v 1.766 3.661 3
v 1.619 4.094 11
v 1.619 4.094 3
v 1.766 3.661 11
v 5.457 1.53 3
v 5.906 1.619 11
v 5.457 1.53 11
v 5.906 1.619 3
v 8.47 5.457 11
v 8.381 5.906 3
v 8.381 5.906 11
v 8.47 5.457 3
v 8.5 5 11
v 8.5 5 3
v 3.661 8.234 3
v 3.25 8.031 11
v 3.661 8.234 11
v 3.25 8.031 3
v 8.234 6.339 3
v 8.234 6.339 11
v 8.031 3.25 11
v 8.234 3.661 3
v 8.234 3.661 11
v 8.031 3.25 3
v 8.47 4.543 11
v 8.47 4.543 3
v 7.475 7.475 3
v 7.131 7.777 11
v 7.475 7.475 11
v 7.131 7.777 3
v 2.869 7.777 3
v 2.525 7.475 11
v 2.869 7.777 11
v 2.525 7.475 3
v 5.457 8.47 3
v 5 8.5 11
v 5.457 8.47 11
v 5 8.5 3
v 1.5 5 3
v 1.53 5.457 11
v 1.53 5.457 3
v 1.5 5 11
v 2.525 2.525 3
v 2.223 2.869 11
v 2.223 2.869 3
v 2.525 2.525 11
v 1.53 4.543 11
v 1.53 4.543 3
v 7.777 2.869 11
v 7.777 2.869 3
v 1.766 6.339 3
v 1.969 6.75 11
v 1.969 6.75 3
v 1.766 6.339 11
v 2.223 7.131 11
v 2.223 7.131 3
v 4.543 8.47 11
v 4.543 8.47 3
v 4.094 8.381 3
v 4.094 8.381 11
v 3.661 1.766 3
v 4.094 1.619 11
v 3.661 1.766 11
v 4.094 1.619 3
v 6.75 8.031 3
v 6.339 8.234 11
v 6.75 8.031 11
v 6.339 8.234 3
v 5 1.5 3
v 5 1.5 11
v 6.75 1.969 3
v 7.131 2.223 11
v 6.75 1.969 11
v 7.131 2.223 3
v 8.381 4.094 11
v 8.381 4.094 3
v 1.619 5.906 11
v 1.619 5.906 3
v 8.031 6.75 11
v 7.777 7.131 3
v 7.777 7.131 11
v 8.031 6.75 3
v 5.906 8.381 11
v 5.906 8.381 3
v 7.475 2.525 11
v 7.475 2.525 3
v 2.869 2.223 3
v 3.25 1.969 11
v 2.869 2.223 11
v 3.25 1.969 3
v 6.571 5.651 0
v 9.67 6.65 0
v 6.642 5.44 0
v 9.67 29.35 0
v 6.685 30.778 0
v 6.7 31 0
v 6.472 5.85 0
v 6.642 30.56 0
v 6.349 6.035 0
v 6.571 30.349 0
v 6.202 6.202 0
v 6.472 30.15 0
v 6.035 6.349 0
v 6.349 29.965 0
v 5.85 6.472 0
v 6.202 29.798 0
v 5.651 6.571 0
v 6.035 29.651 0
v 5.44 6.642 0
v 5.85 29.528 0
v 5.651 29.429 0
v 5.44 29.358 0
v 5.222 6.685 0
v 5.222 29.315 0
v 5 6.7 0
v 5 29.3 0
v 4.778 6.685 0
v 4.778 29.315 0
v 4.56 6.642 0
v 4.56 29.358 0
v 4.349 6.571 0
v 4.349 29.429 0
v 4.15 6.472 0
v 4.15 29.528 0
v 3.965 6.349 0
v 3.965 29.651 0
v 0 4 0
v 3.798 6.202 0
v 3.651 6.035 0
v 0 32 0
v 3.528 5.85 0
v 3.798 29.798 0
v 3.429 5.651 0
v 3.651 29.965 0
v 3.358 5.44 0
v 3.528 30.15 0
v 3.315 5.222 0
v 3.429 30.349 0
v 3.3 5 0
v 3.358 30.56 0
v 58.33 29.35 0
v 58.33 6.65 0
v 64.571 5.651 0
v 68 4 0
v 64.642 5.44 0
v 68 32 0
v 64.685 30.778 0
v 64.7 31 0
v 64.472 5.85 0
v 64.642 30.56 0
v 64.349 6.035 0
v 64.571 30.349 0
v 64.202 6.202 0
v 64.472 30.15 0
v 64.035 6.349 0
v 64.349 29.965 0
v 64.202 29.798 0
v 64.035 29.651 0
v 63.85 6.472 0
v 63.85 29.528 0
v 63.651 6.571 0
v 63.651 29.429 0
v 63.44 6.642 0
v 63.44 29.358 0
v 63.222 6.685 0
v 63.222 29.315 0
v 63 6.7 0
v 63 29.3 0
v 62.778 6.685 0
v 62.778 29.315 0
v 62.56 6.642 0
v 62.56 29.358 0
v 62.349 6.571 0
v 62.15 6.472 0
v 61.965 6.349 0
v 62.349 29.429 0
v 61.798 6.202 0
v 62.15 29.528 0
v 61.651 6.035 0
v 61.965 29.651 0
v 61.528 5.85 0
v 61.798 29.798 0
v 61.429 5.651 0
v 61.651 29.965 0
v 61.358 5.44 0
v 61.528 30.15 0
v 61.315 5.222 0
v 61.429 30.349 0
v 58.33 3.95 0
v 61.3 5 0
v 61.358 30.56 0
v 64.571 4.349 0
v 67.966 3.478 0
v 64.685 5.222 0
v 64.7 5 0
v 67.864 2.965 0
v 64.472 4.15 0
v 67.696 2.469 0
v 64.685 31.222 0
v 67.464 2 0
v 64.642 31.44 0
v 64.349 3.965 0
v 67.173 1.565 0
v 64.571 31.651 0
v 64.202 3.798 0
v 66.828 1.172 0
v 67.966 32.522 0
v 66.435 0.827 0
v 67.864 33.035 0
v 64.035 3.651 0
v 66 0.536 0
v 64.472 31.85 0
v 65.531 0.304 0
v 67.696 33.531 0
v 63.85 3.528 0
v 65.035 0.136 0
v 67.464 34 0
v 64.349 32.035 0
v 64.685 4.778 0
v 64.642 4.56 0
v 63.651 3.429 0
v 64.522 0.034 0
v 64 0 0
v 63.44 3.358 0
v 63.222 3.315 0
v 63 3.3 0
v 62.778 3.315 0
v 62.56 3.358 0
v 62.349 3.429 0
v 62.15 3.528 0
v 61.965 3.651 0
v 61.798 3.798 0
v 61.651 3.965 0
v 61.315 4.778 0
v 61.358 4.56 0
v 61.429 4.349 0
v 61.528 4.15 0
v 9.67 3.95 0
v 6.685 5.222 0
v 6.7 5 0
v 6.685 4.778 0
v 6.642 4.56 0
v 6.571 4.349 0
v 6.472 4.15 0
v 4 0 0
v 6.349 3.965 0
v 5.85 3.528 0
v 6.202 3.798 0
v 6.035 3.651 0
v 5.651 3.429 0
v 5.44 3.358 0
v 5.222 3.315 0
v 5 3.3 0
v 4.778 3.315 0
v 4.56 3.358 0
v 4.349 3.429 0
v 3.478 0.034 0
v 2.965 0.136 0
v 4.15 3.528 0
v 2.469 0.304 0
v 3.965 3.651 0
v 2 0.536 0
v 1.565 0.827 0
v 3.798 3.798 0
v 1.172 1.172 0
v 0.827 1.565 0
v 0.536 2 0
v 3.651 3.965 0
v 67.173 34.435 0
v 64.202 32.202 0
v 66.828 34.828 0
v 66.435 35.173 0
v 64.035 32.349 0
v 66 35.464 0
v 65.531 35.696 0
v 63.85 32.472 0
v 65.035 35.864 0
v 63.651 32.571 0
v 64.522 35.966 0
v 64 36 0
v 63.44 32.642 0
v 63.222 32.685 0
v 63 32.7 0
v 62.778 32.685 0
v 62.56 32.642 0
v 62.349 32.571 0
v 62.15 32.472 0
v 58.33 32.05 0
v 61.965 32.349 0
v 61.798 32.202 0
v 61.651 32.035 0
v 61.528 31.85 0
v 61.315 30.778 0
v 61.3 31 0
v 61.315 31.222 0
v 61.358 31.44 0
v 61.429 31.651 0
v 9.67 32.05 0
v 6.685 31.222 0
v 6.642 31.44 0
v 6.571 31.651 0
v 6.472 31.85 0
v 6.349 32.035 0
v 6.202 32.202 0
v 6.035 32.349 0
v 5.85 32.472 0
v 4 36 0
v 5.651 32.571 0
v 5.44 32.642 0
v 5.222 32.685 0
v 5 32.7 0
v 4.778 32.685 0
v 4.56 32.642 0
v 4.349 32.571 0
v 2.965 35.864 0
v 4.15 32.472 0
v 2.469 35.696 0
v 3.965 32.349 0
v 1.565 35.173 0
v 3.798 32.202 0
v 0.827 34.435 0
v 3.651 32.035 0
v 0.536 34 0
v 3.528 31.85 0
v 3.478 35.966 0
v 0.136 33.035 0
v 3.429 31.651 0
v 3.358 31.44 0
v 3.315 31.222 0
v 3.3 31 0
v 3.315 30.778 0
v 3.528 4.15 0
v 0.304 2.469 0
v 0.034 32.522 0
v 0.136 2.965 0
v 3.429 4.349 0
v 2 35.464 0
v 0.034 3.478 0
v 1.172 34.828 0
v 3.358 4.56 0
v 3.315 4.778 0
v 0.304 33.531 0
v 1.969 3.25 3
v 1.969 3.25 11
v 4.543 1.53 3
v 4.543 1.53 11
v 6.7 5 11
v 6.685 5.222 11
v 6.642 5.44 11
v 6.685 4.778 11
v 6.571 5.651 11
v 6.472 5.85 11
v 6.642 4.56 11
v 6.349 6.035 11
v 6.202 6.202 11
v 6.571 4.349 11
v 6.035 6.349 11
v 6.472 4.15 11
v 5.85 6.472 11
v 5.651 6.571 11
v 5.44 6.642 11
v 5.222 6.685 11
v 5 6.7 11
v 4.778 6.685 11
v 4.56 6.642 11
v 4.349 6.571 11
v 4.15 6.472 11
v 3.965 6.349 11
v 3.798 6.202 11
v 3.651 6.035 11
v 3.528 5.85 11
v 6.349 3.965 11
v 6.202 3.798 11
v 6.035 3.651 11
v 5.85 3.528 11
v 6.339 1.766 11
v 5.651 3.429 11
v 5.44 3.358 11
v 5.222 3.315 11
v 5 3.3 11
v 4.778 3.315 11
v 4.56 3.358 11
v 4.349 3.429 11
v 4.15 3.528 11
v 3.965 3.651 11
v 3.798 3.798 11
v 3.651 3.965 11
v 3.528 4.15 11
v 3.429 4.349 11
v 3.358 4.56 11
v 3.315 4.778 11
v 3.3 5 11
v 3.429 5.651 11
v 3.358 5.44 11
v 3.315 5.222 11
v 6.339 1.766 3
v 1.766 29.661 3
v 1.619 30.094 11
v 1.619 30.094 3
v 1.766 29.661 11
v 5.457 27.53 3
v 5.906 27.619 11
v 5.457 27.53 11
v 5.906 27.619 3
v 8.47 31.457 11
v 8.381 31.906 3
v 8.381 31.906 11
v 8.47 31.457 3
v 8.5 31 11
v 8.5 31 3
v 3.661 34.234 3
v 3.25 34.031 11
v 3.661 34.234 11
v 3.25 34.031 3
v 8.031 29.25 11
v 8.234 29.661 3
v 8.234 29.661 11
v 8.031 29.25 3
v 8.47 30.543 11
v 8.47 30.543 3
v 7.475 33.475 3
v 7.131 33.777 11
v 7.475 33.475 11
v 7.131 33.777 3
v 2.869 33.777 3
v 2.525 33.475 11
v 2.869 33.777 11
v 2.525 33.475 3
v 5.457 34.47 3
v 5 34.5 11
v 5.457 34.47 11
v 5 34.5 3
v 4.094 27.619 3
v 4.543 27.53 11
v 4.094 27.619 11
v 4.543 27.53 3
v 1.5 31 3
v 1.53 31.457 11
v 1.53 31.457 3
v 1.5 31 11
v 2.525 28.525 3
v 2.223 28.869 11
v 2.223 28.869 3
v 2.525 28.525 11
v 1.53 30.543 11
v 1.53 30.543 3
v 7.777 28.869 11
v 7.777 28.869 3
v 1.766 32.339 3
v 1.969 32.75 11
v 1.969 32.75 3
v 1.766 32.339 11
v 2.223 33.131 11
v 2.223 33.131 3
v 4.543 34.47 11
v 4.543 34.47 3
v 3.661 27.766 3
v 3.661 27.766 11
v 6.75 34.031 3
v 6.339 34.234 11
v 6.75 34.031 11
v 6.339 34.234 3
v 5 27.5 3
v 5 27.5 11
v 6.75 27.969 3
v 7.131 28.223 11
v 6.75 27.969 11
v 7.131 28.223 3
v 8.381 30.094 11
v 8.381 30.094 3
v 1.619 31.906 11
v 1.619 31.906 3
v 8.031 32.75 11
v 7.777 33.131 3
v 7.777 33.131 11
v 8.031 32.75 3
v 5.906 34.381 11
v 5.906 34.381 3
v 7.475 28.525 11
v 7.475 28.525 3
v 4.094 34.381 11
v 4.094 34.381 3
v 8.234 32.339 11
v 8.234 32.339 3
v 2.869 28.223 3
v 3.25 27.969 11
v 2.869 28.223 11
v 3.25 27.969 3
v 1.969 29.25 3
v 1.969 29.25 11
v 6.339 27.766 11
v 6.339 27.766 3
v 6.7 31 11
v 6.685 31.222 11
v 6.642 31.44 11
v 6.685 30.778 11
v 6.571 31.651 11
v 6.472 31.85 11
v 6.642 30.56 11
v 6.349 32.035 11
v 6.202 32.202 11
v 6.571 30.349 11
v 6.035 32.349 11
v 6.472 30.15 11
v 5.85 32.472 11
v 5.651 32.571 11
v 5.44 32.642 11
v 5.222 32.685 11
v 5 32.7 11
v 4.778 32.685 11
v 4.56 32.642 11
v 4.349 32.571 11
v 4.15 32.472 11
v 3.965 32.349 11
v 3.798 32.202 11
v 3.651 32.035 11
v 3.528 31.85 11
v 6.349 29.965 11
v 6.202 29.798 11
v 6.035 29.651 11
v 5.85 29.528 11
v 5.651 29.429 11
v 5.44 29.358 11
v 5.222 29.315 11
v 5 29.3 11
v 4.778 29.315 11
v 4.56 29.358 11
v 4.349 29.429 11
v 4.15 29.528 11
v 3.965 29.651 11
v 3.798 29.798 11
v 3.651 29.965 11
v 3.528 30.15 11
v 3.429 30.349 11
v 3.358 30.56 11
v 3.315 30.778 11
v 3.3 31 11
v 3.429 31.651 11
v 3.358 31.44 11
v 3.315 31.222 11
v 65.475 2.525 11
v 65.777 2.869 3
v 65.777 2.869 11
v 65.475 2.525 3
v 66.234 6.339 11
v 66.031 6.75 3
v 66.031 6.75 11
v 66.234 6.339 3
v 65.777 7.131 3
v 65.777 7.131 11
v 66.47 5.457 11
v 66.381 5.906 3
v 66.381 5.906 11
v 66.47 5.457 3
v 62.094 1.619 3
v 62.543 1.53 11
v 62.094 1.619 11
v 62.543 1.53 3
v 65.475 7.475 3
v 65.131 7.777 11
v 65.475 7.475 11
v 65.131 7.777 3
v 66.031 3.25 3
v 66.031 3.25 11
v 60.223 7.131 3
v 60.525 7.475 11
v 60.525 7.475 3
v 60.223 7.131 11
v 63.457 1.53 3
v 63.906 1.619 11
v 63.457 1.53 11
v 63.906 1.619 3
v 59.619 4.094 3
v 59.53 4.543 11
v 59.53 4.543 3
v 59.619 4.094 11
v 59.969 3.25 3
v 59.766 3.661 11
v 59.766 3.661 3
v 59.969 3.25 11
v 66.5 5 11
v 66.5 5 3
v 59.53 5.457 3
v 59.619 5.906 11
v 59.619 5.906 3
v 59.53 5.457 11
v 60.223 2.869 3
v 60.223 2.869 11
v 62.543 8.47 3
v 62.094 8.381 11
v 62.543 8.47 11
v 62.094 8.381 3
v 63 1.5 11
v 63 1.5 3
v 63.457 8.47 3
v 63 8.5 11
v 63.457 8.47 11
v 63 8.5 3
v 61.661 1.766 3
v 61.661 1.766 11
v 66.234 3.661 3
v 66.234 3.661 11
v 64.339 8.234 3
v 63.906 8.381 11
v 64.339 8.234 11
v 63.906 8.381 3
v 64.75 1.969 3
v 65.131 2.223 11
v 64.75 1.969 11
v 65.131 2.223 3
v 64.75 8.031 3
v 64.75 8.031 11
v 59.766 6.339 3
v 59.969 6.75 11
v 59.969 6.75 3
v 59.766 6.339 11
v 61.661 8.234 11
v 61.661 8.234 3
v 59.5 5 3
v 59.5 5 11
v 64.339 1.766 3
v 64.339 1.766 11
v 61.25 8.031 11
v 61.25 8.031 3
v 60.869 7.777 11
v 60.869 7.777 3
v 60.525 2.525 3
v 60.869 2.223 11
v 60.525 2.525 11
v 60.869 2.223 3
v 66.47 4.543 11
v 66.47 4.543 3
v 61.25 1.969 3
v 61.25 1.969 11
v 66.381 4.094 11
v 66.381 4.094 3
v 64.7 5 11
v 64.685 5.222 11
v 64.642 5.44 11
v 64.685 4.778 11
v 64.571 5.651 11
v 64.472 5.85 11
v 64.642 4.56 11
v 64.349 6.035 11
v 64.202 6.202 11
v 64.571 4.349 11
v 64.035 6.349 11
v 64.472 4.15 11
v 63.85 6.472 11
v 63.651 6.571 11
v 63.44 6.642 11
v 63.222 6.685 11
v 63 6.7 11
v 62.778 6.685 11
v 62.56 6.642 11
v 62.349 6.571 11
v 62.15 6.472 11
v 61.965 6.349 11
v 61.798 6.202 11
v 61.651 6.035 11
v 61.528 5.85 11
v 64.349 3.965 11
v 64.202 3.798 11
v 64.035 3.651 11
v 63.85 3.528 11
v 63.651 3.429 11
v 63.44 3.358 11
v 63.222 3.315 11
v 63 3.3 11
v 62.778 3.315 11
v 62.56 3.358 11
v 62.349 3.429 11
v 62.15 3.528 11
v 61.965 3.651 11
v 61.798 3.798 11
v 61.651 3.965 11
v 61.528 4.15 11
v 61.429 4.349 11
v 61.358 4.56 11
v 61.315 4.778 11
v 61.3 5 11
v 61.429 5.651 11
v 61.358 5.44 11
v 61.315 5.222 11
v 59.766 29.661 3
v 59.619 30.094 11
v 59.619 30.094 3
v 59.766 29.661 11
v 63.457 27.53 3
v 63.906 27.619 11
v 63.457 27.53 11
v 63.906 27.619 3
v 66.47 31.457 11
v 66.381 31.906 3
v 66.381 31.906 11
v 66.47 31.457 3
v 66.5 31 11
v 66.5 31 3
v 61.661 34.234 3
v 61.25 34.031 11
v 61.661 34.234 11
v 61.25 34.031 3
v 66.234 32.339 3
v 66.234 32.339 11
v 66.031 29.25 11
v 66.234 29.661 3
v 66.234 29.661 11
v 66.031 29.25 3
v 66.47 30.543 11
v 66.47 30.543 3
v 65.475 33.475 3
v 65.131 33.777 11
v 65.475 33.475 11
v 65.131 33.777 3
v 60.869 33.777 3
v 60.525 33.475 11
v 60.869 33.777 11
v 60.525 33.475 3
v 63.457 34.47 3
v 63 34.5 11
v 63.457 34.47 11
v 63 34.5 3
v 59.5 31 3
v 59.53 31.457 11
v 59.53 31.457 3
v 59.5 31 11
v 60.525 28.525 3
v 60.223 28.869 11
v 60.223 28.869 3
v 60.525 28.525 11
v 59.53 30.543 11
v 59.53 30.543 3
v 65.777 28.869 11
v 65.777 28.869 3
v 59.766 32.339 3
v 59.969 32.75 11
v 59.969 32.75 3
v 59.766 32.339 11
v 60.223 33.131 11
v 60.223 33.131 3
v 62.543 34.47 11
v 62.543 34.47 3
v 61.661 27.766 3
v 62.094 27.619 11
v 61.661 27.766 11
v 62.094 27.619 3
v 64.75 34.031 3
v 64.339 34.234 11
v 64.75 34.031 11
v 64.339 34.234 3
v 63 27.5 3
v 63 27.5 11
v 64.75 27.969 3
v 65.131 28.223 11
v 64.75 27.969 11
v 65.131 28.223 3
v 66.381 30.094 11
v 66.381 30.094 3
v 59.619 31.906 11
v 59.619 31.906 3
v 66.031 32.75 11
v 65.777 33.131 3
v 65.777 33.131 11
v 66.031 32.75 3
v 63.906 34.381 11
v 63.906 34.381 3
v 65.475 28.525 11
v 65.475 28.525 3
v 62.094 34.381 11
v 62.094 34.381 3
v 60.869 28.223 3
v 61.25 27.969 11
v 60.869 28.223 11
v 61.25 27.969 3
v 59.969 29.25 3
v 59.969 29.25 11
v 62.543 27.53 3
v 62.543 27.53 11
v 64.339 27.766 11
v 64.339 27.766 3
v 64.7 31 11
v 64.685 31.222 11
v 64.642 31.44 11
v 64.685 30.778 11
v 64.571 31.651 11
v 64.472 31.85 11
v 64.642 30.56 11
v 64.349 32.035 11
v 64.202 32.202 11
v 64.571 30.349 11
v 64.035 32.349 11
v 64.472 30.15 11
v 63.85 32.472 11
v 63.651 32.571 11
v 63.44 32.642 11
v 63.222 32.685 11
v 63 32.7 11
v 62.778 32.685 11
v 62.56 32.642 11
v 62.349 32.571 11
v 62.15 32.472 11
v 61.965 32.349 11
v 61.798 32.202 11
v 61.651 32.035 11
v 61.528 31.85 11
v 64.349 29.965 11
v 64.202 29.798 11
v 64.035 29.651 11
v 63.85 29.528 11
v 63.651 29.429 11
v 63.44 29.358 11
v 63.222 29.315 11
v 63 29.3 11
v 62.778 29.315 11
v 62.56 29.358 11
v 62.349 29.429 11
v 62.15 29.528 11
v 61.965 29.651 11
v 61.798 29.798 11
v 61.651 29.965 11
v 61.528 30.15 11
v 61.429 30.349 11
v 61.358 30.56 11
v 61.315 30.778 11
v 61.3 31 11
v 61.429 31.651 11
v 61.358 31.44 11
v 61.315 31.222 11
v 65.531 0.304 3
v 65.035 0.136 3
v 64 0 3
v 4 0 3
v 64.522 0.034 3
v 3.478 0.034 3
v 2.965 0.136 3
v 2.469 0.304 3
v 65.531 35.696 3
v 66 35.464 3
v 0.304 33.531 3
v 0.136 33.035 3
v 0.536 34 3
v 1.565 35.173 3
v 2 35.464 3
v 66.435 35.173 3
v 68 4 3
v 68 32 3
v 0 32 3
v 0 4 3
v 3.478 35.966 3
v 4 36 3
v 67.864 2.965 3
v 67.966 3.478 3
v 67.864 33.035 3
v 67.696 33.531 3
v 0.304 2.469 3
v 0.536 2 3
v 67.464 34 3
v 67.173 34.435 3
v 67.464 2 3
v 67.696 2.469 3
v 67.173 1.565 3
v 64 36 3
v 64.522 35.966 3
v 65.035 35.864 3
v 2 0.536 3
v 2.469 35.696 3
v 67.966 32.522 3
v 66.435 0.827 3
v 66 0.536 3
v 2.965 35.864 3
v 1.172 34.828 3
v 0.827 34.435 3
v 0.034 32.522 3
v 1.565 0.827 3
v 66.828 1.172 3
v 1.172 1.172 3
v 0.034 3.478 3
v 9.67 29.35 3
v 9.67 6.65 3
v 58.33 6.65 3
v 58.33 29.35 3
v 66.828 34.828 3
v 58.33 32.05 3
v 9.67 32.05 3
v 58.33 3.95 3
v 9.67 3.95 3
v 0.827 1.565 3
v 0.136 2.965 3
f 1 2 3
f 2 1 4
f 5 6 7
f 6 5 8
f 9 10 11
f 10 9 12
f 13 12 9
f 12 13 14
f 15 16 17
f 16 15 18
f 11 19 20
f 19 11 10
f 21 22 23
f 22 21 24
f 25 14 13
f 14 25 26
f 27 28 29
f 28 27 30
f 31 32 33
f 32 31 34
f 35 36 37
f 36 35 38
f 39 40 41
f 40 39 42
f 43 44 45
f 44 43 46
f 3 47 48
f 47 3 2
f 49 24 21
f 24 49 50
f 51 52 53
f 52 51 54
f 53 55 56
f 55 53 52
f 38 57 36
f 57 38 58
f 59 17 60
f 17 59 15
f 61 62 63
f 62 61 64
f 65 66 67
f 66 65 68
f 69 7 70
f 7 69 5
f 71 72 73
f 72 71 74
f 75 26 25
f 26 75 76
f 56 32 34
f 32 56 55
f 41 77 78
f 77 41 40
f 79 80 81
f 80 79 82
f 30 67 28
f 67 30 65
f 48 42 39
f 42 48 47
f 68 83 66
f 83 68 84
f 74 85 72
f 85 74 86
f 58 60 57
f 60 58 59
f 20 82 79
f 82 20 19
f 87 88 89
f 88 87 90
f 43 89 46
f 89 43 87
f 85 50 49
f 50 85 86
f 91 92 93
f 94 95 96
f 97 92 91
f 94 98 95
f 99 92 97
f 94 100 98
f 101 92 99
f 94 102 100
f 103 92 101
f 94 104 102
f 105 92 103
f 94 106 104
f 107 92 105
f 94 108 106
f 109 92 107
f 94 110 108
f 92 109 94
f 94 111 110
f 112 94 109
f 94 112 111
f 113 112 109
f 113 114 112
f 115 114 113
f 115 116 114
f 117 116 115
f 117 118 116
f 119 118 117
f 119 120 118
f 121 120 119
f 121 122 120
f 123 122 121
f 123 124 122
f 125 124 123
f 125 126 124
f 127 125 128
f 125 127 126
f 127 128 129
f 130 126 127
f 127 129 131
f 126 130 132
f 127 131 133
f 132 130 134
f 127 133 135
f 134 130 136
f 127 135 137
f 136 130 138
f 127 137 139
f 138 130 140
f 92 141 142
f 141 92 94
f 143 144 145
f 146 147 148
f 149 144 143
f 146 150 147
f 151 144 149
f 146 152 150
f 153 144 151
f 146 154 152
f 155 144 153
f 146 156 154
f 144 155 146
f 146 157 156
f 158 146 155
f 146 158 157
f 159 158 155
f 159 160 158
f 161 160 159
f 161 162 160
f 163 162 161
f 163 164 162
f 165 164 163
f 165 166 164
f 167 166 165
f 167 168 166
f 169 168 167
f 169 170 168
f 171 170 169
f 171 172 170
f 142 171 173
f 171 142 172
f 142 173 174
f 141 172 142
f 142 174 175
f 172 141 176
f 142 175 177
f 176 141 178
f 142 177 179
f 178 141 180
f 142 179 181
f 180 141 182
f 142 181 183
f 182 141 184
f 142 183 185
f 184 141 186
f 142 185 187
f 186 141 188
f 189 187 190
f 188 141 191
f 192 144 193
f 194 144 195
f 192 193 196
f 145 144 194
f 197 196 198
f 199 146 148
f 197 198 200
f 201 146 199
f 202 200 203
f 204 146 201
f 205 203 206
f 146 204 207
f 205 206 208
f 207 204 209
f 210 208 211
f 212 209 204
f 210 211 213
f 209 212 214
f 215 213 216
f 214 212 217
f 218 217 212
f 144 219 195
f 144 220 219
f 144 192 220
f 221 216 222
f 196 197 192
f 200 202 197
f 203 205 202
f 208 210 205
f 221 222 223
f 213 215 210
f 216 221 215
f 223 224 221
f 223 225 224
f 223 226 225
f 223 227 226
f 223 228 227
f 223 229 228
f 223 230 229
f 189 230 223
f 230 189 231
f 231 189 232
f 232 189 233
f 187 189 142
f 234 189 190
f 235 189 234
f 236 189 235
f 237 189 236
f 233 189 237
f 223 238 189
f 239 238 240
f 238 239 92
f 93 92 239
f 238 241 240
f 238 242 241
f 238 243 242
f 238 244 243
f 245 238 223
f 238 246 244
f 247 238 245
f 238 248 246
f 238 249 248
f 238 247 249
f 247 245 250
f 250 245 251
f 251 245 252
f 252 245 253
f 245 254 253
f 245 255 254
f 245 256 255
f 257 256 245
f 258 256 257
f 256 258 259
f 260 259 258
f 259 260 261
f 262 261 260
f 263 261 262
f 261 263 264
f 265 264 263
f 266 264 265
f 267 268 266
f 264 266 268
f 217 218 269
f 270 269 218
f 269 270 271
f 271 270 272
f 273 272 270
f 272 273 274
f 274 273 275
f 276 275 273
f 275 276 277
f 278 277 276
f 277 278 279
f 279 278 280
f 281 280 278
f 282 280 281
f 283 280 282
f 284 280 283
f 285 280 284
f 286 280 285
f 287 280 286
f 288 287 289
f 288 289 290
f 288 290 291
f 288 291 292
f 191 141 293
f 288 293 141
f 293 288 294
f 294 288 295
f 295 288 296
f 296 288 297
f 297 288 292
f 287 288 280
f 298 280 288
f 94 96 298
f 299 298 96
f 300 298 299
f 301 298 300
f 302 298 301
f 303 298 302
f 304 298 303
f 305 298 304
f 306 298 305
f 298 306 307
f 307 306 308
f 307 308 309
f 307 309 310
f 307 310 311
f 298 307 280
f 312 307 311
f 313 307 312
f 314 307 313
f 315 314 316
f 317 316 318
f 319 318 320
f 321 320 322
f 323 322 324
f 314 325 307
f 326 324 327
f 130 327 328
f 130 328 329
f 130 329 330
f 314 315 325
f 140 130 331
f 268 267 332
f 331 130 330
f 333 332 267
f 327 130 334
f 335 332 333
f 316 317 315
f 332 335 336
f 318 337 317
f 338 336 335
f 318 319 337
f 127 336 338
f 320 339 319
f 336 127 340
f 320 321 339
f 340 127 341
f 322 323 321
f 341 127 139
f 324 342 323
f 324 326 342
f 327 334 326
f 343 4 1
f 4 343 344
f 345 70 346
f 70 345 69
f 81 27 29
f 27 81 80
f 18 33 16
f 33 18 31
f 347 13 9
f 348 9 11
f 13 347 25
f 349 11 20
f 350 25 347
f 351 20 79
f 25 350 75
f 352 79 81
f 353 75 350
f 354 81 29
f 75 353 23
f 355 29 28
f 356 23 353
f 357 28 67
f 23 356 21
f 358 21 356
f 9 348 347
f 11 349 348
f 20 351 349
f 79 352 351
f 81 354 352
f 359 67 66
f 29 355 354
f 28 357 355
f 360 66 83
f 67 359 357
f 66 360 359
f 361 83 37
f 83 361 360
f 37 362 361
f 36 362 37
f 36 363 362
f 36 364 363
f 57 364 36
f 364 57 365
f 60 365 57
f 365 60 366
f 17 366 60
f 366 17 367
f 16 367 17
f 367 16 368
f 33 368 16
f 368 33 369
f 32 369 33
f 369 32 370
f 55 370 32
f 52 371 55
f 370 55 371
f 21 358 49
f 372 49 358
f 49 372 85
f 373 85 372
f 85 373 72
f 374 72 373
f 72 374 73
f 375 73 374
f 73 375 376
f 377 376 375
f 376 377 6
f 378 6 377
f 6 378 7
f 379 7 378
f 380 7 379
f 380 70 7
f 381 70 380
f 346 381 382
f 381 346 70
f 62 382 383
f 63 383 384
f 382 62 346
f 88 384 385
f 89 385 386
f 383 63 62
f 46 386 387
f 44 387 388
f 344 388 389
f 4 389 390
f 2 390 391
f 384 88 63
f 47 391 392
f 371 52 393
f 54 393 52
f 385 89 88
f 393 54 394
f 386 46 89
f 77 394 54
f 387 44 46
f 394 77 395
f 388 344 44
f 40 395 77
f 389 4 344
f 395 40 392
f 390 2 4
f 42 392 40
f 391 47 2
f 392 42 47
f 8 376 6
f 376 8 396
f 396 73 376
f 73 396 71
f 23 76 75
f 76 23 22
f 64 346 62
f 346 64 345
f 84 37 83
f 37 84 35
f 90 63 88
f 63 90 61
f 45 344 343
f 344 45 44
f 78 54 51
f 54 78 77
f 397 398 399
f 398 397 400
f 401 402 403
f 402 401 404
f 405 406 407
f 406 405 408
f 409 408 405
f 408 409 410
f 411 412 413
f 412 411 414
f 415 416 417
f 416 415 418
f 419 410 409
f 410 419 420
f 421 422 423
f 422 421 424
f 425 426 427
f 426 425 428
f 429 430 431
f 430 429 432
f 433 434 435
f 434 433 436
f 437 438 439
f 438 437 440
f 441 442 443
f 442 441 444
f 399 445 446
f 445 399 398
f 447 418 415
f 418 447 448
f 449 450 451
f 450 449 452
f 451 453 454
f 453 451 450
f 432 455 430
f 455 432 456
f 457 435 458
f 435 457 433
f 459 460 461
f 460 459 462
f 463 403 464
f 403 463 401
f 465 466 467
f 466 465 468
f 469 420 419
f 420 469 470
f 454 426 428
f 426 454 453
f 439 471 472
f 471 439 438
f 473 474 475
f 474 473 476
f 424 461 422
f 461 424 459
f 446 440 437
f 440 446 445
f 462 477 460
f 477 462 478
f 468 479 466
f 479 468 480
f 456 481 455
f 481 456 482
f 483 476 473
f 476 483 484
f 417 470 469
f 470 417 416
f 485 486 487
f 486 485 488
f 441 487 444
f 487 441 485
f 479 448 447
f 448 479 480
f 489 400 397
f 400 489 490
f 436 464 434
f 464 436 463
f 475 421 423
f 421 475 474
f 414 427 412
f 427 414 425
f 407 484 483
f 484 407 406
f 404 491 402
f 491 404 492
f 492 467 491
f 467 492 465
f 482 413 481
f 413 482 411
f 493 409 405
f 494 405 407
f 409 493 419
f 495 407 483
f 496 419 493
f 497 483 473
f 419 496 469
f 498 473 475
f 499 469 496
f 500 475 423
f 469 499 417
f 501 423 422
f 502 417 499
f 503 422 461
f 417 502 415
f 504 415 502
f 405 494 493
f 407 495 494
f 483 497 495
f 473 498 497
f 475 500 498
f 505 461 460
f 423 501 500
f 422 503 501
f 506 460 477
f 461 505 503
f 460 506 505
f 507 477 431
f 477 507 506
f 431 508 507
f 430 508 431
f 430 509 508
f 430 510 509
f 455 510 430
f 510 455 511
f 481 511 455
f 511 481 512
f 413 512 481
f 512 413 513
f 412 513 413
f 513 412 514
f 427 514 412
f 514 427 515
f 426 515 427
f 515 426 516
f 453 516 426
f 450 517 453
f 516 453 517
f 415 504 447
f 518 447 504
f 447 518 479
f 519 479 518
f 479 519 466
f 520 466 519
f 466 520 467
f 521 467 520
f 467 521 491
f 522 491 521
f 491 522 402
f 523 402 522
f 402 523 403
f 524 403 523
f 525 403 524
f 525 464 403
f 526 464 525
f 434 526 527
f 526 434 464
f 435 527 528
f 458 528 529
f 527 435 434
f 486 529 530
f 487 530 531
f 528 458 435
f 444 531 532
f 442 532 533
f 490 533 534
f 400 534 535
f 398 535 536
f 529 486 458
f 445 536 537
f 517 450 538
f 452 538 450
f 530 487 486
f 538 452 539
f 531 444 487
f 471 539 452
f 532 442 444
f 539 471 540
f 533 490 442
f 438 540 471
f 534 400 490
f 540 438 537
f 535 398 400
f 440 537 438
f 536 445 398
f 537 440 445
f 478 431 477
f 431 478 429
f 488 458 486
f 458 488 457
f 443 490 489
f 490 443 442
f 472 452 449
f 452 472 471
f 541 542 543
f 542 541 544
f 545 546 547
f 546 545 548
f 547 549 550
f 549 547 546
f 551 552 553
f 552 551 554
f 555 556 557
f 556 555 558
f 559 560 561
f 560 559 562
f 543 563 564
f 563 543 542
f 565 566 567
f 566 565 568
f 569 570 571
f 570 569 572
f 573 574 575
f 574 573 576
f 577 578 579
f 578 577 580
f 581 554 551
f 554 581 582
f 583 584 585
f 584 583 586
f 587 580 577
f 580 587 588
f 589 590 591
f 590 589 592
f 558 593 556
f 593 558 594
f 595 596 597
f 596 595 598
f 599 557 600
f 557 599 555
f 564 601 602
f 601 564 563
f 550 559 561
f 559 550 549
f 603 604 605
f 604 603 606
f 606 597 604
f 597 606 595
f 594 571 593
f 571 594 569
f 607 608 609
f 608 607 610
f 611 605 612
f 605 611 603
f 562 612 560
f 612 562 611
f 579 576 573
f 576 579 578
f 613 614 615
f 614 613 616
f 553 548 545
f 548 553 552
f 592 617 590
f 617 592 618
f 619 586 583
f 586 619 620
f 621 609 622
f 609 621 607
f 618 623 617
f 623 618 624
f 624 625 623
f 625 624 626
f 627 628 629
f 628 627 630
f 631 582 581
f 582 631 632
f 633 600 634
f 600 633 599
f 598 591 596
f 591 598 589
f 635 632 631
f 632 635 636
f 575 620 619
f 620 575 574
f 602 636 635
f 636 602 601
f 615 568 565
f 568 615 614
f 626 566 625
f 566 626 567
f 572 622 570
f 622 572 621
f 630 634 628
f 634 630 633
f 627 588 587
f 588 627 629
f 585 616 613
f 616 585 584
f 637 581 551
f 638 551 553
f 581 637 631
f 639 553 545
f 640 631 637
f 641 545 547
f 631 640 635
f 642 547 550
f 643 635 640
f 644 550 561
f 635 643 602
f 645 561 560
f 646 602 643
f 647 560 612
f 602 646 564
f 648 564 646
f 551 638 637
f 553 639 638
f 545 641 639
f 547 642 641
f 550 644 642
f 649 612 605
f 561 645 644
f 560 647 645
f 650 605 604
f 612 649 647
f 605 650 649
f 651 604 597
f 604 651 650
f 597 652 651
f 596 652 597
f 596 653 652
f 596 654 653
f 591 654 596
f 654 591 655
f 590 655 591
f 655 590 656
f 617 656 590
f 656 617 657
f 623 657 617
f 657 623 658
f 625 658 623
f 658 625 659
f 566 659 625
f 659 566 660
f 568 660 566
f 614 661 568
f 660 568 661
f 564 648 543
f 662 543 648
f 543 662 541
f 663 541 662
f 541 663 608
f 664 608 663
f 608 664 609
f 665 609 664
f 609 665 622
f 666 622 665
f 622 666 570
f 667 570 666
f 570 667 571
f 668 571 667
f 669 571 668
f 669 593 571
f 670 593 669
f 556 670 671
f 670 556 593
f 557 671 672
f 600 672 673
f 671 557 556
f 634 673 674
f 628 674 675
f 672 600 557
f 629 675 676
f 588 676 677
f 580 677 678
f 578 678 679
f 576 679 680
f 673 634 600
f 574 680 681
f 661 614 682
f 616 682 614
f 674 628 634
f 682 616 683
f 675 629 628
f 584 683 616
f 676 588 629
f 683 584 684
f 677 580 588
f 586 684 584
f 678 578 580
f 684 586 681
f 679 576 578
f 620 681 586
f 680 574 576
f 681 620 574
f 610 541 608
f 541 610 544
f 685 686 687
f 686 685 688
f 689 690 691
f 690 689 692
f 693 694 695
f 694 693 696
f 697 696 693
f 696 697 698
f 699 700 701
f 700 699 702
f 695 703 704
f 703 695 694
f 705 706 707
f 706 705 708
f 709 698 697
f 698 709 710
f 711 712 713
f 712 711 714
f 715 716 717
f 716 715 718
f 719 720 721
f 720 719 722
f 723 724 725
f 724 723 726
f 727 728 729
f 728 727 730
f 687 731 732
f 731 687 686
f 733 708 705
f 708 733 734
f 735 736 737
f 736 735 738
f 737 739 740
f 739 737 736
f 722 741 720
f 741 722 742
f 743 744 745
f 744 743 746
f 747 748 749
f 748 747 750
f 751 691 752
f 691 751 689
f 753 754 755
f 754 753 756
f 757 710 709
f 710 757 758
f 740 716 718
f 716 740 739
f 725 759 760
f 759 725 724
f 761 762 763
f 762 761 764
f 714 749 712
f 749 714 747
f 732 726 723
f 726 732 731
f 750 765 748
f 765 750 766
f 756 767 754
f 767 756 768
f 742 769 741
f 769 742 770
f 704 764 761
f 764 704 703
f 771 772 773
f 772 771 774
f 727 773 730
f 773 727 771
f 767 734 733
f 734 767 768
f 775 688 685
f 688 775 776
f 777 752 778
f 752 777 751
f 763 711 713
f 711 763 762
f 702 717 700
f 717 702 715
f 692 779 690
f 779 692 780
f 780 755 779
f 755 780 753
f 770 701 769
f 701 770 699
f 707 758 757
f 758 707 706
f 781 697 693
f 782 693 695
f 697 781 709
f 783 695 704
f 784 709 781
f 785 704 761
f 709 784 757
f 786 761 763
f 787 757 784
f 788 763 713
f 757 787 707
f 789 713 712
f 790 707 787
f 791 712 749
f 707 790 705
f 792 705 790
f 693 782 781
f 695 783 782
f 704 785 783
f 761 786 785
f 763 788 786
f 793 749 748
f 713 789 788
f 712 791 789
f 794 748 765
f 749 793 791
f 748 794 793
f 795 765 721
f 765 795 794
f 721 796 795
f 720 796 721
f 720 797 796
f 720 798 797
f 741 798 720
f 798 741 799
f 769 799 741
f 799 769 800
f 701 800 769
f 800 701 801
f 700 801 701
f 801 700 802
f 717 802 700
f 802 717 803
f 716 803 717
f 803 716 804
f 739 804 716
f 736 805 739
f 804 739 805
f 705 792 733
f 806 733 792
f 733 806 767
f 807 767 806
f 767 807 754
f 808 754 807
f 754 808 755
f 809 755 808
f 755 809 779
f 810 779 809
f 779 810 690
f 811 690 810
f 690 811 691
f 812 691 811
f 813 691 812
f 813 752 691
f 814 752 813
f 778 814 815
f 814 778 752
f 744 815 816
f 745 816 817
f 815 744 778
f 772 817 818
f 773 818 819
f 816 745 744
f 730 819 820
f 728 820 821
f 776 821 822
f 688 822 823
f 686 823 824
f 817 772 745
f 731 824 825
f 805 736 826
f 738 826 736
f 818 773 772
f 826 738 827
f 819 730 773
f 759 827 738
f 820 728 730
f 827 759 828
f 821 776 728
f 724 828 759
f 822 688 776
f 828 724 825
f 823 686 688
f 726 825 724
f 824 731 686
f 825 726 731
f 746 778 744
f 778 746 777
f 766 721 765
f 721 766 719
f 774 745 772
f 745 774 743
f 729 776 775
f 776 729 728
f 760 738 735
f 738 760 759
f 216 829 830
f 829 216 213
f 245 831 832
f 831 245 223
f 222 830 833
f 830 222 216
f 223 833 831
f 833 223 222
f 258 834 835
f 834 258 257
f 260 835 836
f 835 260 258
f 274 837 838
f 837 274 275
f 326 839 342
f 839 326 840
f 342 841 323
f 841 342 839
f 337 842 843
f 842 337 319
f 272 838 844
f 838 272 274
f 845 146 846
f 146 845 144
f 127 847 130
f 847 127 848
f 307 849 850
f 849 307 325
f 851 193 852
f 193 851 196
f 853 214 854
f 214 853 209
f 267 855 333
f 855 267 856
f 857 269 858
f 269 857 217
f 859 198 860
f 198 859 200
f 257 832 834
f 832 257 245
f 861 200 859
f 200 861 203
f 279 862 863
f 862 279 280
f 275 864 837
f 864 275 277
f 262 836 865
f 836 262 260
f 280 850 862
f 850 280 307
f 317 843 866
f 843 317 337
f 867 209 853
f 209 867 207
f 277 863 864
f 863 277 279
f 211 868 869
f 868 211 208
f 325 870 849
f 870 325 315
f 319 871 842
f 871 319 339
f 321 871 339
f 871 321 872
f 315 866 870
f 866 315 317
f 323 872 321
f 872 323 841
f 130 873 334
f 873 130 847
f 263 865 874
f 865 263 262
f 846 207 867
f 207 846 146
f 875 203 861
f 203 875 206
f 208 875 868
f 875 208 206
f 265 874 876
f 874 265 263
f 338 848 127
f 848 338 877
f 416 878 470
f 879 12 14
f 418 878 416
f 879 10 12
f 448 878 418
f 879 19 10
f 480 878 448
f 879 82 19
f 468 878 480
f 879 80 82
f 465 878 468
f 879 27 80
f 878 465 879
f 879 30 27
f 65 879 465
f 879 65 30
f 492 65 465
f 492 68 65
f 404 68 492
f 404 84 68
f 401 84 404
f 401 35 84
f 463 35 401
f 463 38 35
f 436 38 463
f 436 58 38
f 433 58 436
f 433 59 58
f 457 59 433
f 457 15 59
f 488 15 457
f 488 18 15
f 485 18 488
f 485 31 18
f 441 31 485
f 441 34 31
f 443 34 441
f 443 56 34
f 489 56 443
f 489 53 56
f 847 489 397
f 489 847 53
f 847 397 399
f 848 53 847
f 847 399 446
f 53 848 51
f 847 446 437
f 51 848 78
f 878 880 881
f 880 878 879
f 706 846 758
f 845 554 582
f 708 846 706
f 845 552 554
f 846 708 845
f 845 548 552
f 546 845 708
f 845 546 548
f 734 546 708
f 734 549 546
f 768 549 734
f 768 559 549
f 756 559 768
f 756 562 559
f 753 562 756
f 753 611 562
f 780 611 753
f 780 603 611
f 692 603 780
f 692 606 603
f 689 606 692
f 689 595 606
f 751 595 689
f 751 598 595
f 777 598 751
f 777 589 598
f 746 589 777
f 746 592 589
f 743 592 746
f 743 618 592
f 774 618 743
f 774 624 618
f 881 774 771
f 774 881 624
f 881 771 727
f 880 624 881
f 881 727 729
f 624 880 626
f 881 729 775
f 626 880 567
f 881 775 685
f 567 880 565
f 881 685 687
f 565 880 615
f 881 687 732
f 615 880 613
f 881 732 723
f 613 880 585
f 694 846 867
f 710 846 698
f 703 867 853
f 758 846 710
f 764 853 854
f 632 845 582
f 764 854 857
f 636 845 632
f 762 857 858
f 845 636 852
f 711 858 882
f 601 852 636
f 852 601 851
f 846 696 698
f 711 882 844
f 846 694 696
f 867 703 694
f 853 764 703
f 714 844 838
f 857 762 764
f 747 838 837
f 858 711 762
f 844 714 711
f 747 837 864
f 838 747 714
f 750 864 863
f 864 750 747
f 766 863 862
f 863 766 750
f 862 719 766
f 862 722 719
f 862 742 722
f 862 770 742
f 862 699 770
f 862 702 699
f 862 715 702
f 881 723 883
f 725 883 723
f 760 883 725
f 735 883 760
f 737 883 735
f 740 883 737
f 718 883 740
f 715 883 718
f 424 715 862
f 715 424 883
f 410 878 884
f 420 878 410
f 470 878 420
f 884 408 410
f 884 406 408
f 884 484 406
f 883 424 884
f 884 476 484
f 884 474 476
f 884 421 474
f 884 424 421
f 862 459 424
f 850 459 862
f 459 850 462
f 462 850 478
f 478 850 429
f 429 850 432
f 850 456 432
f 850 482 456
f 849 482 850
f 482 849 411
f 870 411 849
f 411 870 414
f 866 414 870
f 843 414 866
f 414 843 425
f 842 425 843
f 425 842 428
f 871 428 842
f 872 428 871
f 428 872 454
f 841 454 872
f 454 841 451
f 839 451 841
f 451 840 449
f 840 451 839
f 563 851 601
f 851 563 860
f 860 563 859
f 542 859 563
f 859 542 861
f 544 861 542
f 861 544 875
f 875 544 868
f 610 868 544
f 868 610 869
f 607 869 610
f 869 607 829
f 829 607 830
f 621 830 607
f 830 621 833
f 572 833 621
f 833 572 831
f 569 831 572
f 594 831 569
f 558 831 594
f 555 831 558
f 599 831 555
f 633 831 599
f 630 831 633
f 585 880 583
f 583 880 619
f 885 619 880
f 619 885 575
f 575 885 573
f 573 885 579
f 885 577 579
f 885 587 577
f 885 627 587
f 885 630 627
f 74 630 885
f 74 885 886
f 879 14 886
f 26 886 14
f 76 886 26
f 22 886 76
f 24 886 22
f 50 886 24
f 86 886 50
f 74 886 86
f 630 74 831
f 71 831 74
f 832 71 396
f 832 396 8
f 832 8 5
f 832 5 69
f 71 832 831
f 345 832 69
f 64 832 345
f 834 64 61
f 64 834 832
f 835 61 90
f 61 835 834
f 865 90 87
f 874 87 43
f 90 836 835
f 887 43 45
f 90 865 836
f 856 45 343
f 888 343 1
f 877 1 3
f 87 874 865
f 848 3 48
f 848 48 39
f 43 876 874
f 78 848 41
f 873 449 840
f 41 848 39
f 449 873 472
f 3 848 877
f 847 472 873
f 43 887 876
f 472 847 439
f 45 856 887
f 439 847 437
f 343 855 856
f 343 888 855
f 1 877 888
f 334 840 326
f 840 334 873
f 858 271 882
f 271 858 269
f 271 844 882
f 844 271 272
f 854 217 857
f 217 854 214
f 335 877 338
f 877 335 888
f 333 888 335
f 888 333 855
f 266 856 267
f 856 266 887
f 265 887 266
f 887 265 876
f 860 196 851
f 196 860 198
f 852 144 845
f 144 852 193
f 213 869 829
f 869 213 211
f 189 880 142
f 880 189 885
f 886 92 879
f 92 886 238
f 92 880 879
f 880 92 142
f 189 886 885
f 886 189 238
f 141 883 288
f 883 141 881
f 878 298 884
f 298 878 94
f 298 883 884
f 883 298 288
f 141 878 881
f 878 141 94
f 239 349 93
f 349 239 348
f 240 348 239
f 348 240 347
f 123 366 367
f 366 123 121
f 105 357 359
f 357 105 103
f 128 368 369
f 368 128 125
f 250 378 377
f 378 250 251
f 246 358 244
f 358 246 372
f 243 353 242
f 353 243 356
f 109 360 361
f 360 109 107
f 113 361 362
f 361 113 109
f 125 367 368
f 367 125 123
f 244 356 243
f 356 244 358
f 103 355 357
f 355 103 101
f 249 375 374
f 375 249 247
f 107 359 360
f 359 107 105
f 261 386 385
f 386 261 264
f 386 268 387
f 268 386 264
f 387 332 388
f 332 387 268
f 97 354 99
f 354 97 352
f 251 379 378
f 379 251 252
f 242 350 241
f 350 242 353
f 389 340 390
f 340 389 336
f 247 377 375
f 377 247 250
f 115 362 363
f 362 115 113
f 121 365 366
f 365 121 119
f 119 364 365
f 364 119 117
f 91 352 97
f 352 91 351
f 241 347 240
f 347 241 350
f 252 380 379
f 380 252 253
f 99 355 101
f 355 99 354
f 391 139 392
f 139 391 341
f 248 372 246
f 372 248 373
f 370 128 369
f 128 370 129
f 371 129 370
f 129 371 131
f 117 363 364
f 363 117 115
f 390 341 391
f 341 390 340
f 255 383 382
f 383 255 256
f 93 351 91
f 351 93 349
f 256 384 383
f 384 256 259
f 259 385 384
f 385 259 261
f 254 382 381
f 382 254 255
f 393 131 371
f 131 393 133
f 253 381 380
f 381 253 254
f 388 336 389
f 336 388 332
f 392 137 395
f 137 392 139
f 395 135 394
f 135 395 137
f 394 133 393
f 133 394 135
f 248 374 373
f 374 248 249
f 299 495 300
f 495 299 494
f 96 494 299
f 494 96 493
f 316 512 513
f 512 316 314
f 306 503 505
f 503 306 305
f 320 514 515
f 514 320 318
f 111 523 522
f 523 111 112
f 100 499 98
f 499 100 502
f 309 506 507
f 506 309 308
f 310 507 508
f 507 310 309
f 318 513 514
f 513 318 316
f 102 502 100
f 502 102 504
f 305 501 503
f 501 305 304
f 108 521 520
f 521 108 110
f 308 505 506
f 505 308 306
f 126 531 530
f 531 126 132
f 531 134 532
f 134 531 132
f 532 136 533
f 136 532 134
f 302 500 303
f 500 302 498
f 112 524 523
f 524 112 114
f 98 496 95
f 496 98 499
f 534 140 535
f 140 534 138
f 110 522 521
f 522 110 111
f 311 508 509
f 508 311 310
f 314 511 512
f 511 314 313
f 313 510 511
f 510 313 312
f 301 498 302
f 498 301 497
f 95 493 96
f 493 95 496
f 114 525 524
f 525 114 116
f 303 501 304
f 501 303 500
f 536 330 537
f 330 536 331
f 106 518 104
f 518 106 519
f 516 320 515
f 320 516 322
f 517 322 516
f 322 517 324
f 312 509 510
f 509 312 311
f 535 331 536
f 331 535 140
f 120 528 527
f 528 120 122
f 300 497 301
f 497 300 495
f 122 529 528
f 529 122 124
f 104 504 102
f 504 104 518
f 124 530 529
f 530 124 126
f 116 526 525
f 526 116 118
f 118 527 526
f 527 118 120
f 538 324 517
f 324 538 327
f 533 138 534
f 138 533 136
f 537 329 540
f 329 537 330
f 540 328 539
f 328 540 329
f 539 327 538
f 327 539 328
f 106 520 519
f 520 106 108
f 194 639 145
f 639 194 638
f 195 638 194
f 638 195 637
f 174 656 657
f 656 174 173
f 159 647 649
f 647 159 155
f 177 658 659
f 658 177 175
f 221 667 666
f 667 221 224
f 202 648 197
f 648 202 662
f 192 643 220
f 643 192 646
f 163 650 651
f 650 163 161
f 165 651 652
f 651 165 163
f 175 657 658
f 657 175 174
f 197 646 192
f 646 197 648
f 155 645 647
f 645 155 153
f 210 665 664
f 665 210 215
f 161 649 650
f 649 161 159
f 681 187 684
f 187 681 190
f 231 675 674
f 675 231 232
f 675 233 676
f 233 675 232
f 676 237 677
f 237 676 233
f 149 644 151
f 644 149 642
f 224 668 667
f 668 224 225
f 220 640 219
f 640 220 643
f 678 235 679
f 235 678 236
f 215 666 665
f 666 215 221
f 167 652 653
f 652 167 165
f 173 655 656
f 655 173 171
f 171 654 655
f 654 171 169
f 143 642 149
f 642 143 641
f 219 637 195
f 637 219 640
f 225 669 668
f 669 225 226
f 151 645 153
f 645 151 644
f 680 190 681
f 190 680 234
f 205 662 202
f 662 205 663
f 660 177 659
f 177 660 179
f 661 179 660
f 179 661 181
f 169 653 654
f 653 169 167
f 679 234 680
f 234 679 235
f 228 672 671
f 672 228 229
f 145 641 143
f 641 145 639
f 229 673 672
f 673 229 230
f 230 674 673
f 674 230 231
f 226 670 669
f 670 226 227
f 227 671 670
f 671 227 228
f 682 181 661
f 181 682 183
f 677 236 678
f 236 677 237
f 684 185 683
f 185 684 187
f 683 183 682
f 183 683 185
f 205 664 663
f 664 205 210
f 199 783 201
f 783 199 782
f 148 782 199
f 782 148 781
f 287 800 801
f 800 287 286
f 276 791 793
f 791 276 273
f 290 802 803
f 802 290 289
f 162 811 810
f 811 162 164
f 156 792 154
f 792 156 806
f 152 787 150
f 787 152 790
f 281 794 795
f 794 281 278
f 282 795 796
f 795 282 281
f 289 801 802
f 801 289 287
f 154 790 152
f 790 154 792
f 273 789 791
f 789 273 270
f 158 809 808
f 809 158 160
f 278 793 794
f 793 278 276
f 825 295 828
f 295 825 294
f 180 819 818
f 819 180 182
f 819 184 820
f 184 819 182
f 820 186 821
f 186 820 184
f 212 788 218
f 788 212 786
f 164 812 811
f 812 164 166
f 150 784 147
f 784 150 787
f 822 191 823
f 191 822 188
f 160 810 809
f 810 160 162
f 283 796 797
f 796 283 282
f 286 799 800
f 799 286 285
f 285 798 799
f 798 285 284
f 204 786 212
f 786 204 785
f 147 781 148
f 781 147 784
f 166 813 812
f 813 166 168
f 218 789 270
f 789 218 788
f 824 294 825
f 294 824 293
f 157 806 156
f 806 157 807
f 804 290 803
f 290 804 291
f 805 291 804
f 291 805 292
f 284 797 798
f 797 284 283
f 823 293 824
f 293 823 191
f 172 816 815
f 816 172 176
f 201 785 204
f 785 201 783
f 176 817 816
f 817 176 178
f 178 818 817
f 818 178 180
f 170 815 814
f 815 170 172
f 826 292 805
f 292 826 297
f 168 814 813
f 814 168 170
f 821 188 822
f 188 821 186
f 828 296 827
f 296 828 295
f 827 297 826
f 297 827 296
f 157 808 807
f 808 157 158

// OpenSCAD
// ESP32 DevKit header carrier - The Build Book
// https://tobno683.github.io/arduino-build-book/basics/printing.html#prints
//
// Printed plate-down. Turned over, the corner posts are its feet.
// Press a female header strip into each slot, flush with the underside.
//
// Millimetres. Change the numbers at the top and render (F6); everything
// below follows from them. Written by tools/make-prints.js from the same
// numbers as the STL next to it.

/* [Board] */
pins = 19;        // per row
pitch = 2.54;
rows = 25.4;     // centre to centre across the two pin rows - MEASURE YOURS

/* [Carrier] */
slot_w = 2.7;      // a female header is about 2.5 mm wide, and printed slots come out narrow
slot_extra = 0.4;  // added to the slot length
plate = [68, 36];
plate_t = 3;
corner_r = 4;
foot_d = 7;
foot_h = 8;       // room under the carrier for the header pins and wiring
foot_hole = 3.4;  // M3 clearance - use your fit-test result
foot_inset = 5;

/* [Hidden] */
$fn = 48;

slot_len = pins * pitch + slot_extra;

module rounded_rect(size, r) {
  translate([r, r]) offset(r = r) square([size[0] - 2 * r, size[1] - 2 * r]);
}

difference() {
  union() {
    linear_extrude(plate_t) rounded_rect(plate, corner_r);
    for (x = [foot_inset, plate[0] - foot_inset], y = [foot_inset, plate[1] - foot_inset])
      translate([x, y, 0]) cylinder(d = foot_d, h = plate_t + foot_h);
  }
  for (s = [-1, 1])
    translate([plate[0] / 2 - slot_len / 2, plate[1] / 2 + s * rows / 2 - slot_w / 2, -1])
      cube([slot_len, slot_w, plate_t + 2]);
  for (x = [foot_inset, plate[0] - foot_inset], y = [foot_inset, plate[1] - foot_inset])
    translate([x, y, -1]) cylinder(d = foot_hole, h = plate_t + foot_h + 2);
}
